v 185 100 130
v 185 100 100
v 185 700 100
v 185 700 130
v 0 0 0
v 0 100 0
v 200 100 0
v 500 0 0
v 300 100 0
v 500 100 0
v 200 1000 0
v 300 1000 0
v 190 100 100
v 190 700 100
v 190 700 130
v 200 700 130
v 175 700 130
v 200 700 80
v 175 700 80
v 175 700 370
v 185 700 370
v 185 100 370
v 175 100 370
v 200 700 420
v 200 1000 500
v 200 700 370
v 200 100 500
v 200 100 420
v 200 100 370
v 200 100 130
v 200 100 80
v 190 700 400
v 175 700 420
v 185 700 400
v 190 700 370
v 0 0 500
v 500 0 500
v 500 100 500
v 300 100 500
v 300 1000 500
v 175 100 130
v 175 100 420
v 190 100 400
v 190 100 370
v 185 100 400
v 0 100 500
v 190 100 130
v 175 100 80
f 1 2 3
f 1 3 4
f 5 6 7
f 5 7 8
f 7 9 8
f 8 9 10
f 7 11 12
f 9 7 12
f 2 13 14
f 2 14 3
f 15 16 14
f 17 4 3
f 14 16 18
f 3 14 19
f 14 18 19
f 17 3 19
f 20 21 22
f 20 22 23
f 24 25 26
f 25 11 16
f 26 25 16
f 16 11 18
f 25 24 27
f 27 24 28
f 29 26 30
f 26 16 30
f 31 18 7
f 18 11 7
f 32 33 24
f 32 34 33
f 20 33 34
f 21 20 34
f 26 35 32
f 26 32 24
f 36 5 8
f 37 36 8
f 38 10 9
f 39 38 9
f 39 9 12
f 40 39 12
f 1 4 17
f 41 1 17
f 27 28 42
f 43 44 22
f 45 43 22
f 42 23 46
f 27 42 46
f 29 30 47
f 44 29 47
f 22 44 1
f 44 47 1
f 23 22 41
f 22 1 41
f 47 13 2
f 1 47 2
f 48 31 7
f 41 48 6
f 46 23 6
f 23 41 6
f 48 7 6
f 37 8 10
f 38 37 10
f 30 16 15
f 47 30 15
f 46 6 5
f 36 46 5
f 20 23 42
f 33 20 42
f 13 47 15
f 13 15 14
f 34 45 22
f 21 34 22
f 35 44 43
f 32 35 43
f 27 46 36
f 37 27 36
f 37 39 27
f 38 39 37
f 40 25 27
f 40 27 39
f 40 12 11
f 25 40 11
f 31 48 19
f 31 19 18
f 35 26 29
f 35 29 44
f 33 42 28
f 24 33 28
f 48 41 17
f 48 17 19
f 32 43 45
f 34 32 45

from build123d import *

# Parameters (mm, degrees)
BOSS_EXTRU_1_DEPTH = 500
BOSS_EXTRU_3_DEPTH = 600


with BuildPart() as part:
    # Esquisse1 → Boss.-Extru.1 (new body)
    with BuildSketch(Plane.XY):
        Polygon((0, 0), (500, 0), (500, 100), (300, 100), (300, 1000), (200, 1000), (200, 100), (0, 100), align=None)
    extrude(amount=BOSS_EXTRU_1_DEPTH)

    # Esquisse4 → Boss.-Extru.3 (add)
    with BuildSketch(Plane(origin=(0, 100, 0), x_dir=(1, 0, 0), z_dir=(0, 1, 0))):
        Polygon((200, -80), (200, -130), (190, -130), (190, -100), (185, -100), (185, -130), (175, -130), (175, -80), align=None)
        Polygon((175, -370), (175, -420), (200, -420), (200, -370), (190, -370), (190, -400), (185, -400), (185, -370), align=None)
    extrude(amount=BOSS_EXTRU_3_DEPTH)


solid = part.part
